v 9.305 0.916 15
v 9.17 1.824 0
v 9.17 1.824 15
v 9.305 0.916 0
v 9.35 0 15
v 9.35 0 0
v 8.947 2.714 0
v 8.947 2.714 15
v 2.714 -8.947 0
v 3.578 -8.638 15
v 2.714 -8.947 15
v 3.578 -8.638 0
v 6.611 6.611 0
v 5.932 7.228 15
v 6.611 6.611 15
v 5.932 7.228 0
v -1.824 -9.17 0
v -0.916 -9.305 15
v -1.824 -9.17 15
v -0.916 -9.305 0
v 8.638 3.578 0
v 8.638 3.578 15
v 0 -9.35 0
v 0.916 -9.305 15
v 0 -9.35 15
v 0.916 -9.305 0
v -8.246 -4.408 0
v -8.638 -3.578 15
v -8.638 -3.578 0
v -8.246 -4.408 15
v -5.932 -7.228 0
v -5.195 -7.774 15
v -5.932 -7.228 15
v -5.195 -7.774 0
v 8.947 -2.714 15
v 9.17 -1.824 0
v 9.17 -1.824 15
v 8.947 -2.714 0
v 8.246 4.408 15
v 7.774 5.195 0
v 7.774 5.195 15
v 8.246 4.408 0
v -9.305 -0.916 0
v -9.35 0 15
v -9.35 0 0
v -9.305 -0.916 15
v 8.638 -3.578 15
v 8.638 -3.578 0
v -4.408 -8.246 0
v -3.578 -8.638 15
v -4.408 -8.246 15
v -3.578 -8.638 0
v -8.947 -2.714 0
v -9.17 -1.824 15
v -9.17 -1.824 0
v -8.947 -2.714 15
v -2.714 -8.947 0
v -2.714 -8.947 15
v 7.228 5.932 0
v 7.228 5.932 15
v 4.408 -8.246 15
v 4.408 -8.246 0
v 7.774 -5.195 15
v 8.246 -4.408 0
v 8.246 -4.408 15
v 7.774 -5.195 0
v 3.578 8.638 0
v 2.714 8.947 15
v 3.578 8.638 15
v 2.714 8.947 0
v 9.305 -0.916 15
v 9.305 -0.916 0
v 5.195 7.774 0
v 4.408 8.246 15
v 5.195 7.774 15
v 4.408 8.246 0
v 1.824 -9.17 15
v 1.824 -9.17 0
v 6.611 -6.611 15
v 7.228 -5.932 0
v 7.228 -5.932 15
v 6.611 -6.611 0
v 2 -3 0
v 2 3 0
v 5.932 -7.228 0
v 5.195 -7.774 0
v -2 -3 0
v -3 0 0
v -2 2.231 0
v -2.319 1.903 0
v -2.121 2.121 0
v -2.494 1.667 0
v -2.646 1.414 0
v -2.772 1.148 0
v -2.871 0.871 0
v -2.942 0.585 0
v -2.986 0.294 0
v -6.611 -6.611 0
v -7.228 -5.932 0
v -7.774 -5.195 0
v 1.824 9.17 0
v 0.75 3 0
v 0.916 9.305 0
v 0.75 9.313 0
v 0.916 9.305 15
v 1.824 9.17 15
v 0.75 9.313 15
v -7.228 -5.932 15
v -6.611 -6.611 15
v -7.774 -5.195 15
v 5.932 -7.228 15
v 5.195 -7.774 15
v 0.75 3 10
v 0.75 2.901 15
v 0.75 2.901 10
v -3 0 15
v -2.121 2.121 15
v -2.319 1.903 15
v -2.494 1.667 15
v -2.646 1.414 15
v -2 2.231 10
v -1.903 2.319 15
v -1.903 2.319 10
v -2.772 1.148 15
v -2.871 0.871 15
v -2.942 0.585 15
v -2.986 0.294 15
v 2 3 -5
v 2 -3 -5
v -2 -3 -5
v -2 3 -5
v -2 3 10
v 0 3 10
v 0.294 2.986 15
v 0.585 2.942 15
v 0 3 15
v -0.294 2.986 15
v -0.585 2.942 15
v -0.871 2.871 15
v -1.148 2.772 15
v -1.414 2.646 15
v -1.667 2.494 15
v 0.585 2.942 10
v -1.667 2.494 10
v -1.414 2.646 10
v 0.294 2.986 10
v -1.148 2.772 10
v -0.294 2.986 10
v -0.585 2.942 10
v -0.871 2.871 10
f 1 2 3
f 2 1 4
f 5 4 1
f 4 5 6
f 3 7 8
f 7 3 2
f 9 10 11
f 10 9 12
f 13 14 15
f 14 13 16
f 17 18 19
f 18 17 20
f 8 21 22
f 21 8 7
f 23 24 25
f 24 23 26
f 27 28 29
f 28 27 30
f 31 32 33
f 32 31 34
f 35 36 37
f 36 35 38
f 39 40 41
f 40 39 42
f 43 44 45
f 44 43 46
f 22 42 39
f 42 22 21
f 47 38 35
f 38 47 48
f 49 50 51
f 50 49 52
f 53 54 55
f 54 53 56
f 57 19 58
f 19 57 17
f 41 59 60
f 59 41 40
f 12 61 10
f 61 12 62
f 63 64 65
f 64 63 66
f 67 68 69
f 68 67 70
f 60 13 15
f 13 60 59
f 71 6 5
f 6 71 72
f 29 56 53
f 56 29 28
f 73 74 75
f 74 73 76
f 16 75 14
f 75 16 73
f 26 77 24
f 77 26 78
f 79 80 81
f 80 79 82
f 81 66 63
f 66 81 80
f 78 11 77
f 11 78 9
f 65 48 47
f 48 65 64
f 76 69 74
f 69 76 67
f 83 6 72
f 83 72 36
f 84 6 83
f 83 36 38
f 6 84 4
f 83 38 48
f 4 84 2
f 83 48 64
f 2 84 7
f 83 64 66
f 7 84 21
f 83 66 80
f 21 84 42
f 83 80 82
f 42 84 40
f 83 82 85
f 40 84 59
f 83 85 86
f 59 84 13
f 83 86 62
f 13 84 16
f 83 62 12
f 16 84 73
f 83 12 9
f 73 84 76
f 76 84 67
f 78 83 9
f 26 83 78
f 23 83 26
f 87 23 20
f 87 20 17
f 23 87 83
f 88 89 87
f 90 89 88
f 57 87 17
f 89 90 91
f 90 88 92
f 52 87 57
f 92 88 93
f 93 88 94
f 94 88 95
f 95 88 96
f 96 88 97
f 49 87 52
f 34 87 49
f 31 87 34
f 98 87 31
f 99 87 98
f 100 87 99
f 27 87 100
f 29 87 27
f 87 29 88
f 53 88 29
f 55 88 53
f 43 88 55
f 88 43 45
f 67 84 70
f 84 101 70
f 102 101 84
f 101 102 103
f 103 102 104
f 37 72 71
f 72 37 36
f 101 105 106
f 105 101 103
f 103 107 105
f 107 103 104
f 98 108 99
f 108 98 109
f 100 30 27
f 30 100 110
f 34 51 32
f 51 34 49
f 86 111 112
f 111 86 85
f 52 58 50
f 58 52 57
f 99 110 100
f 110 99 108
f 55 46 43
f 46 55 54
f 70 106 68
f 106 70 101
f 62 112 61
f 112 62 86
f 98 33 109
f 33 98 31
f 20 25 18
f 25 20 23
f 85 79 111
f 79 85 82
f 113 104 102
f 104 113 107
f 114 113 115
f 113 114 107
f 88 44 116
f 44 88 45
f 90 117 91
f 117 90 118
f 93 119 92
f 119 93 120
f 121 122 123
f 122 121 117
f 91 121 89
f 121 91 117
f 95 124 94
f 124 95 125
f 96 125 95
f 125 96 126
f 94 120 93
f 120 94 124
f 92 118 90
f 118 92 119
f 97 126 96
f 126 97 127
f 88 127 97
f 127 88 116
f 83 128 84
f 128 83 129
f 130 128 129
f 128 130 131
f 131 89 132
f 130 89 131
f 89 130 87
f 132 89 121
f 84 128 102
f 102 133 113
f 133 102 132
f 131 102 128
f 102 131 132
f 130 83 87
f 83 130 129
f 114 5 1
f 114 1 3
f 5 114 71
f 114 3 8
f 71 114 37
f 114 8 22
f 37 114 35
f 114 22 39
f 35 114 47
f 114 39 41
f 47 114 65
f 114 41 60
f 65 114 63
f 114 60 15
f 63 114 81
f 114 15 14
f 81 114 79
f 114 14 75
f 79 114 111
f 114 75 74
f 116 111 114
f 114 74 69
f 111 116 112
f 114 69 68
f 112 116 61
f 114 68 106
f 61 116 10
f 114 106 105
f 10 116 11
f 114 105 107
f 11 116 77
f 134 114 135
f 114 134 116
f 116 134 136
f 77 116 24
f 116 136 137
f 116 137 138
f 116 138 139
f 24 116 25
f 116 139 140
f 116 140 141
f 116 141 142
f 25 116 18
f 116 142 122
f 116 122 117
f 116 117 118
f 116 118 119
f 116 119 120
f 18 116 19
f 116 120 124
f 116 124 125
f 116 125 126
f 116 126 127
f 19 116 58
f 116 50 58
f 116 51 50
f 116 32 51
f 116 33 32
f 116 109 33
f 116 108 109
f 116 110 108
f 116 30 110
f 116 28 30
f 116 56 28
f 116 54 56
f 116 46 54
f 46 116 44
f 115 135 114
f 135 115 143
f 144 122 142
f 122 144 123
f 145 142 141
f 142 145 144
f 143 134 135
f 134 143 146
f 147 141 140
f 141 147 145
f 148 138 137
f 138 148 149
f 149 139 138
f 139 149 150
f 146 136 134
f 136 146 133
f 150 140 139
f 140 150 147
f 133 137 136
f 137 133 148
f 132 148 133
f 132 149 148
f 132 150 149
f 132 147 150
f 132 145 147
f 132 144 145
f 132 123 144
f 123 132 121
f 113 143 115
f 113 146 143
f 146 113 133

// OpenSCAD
// Dimensions for the Snap-On Clip Design

// Overall part height
height_z = 10; // Total extrusion height in Z direction (mm)

// Rod Ring dimensions (Ring 1)
rod_ring_inner_diameter = 12.7; // Inner diameter of the rod ring (mm)
rod_ring_wall_thickness = 3;     // Wall thickness of the rod ring (mm)
rod_ring_outer_diameter = rod_ring_inner_diameter + 2 * rod_ring_wall_thickness; // Calculated outer diameter (18.7 mm)

// Tubing Ring dimensions (Ring 2)
tubing_ring_inner_diameter = 6;  // Inner diameter of the tubing ring (mm)
tubing_ring_wall_thickness = 2;  // Wall thickness of the tubing ring (mm)
tubing_ring_center_x = 15;       // Center X position for the tubing ring (mm)
tubing_ring_center_y = 0;        // Center Y position for the tubing ring (mm)

// Bridge dimensions (Solid Connector)
bridge_width_y = 6;              // Width of the solid bridge in the Y direction (mm)
bridge_start_x = 8;              // Start X position of the bridge (mm)
bridge_end_x = 12;               // End X position of the bridge (mm)

// Cutout dimensions for Ring 1 (Rod Snap)
rod_cutout_width = 10;           // Width of the opening cut out on the -X side (mm)
rod_cutout_y_range = [-5, 5];     // Y range for the cutout on Ring 1

// Cutout dimensions for Ring 2 (Tubing Alignment)
tubing_cutout_width = 4.5;        // Width of the opening cut out on the +X side (mm)
tubing_cutout_y_range = [-2.25, 2.25]; // Y range for the cutout on Ring 2

// Tolerance for cuts (to ensure separation)
tolerance = 0.1; // Small offset for cutting operations

// --- Module Definitions ---

module rod_ring() {
    difference() {
        // Base ring shape (Outer circle)
        cylinder(h = height_z, r = rod_ring_outer_diameter / 2, $fn = 64);

        // Cutout for snapping onto the rod (on the -X side)
        translate([-(rod_ring_outer_diameter / 2) - tolerance, 0, 0]) {
            cube([rod_cutout_width + 2 * tolerance, 10, height_z]); // Cut a block extending past the edge
        }
    }
}

module tubing_ring() {
    difference() {
        // Base ring shape (Outer circle)
        cylinder(h = height_z, r = tubing_ring_inner_diameter / 2, $fn = 64);

        // Cutout for tubing alignment (on the +X side)
        translate([tubing_ring_center_x + tubing_ring_wall_thickness + tolerance, 0, 0]) {
            cube([tubing_cutout_width + 2 * tolerance, 10, height_z]); // Cut a block extending past the edge
        }
    }
}

module bridge() {
    // Solid rectangular bridge connecting the rings
    cube([bridge_end_x - bridge_start_x, bridge_width_y, height_z], center = true);
}

// --- Main Assembly ---

union() {
    rod_ring();
    tubing_ring();
    bridge();
}

// Apply translation to lift the entire assembly so its lowest point is at Z=0.
// Based on the report showing a lowest point at -5, we translate by 5 mm.
translate([0, 0, 5]) {
    union() {
        rod_ring();
        tubing_ring();
        bridge();
    }
}
